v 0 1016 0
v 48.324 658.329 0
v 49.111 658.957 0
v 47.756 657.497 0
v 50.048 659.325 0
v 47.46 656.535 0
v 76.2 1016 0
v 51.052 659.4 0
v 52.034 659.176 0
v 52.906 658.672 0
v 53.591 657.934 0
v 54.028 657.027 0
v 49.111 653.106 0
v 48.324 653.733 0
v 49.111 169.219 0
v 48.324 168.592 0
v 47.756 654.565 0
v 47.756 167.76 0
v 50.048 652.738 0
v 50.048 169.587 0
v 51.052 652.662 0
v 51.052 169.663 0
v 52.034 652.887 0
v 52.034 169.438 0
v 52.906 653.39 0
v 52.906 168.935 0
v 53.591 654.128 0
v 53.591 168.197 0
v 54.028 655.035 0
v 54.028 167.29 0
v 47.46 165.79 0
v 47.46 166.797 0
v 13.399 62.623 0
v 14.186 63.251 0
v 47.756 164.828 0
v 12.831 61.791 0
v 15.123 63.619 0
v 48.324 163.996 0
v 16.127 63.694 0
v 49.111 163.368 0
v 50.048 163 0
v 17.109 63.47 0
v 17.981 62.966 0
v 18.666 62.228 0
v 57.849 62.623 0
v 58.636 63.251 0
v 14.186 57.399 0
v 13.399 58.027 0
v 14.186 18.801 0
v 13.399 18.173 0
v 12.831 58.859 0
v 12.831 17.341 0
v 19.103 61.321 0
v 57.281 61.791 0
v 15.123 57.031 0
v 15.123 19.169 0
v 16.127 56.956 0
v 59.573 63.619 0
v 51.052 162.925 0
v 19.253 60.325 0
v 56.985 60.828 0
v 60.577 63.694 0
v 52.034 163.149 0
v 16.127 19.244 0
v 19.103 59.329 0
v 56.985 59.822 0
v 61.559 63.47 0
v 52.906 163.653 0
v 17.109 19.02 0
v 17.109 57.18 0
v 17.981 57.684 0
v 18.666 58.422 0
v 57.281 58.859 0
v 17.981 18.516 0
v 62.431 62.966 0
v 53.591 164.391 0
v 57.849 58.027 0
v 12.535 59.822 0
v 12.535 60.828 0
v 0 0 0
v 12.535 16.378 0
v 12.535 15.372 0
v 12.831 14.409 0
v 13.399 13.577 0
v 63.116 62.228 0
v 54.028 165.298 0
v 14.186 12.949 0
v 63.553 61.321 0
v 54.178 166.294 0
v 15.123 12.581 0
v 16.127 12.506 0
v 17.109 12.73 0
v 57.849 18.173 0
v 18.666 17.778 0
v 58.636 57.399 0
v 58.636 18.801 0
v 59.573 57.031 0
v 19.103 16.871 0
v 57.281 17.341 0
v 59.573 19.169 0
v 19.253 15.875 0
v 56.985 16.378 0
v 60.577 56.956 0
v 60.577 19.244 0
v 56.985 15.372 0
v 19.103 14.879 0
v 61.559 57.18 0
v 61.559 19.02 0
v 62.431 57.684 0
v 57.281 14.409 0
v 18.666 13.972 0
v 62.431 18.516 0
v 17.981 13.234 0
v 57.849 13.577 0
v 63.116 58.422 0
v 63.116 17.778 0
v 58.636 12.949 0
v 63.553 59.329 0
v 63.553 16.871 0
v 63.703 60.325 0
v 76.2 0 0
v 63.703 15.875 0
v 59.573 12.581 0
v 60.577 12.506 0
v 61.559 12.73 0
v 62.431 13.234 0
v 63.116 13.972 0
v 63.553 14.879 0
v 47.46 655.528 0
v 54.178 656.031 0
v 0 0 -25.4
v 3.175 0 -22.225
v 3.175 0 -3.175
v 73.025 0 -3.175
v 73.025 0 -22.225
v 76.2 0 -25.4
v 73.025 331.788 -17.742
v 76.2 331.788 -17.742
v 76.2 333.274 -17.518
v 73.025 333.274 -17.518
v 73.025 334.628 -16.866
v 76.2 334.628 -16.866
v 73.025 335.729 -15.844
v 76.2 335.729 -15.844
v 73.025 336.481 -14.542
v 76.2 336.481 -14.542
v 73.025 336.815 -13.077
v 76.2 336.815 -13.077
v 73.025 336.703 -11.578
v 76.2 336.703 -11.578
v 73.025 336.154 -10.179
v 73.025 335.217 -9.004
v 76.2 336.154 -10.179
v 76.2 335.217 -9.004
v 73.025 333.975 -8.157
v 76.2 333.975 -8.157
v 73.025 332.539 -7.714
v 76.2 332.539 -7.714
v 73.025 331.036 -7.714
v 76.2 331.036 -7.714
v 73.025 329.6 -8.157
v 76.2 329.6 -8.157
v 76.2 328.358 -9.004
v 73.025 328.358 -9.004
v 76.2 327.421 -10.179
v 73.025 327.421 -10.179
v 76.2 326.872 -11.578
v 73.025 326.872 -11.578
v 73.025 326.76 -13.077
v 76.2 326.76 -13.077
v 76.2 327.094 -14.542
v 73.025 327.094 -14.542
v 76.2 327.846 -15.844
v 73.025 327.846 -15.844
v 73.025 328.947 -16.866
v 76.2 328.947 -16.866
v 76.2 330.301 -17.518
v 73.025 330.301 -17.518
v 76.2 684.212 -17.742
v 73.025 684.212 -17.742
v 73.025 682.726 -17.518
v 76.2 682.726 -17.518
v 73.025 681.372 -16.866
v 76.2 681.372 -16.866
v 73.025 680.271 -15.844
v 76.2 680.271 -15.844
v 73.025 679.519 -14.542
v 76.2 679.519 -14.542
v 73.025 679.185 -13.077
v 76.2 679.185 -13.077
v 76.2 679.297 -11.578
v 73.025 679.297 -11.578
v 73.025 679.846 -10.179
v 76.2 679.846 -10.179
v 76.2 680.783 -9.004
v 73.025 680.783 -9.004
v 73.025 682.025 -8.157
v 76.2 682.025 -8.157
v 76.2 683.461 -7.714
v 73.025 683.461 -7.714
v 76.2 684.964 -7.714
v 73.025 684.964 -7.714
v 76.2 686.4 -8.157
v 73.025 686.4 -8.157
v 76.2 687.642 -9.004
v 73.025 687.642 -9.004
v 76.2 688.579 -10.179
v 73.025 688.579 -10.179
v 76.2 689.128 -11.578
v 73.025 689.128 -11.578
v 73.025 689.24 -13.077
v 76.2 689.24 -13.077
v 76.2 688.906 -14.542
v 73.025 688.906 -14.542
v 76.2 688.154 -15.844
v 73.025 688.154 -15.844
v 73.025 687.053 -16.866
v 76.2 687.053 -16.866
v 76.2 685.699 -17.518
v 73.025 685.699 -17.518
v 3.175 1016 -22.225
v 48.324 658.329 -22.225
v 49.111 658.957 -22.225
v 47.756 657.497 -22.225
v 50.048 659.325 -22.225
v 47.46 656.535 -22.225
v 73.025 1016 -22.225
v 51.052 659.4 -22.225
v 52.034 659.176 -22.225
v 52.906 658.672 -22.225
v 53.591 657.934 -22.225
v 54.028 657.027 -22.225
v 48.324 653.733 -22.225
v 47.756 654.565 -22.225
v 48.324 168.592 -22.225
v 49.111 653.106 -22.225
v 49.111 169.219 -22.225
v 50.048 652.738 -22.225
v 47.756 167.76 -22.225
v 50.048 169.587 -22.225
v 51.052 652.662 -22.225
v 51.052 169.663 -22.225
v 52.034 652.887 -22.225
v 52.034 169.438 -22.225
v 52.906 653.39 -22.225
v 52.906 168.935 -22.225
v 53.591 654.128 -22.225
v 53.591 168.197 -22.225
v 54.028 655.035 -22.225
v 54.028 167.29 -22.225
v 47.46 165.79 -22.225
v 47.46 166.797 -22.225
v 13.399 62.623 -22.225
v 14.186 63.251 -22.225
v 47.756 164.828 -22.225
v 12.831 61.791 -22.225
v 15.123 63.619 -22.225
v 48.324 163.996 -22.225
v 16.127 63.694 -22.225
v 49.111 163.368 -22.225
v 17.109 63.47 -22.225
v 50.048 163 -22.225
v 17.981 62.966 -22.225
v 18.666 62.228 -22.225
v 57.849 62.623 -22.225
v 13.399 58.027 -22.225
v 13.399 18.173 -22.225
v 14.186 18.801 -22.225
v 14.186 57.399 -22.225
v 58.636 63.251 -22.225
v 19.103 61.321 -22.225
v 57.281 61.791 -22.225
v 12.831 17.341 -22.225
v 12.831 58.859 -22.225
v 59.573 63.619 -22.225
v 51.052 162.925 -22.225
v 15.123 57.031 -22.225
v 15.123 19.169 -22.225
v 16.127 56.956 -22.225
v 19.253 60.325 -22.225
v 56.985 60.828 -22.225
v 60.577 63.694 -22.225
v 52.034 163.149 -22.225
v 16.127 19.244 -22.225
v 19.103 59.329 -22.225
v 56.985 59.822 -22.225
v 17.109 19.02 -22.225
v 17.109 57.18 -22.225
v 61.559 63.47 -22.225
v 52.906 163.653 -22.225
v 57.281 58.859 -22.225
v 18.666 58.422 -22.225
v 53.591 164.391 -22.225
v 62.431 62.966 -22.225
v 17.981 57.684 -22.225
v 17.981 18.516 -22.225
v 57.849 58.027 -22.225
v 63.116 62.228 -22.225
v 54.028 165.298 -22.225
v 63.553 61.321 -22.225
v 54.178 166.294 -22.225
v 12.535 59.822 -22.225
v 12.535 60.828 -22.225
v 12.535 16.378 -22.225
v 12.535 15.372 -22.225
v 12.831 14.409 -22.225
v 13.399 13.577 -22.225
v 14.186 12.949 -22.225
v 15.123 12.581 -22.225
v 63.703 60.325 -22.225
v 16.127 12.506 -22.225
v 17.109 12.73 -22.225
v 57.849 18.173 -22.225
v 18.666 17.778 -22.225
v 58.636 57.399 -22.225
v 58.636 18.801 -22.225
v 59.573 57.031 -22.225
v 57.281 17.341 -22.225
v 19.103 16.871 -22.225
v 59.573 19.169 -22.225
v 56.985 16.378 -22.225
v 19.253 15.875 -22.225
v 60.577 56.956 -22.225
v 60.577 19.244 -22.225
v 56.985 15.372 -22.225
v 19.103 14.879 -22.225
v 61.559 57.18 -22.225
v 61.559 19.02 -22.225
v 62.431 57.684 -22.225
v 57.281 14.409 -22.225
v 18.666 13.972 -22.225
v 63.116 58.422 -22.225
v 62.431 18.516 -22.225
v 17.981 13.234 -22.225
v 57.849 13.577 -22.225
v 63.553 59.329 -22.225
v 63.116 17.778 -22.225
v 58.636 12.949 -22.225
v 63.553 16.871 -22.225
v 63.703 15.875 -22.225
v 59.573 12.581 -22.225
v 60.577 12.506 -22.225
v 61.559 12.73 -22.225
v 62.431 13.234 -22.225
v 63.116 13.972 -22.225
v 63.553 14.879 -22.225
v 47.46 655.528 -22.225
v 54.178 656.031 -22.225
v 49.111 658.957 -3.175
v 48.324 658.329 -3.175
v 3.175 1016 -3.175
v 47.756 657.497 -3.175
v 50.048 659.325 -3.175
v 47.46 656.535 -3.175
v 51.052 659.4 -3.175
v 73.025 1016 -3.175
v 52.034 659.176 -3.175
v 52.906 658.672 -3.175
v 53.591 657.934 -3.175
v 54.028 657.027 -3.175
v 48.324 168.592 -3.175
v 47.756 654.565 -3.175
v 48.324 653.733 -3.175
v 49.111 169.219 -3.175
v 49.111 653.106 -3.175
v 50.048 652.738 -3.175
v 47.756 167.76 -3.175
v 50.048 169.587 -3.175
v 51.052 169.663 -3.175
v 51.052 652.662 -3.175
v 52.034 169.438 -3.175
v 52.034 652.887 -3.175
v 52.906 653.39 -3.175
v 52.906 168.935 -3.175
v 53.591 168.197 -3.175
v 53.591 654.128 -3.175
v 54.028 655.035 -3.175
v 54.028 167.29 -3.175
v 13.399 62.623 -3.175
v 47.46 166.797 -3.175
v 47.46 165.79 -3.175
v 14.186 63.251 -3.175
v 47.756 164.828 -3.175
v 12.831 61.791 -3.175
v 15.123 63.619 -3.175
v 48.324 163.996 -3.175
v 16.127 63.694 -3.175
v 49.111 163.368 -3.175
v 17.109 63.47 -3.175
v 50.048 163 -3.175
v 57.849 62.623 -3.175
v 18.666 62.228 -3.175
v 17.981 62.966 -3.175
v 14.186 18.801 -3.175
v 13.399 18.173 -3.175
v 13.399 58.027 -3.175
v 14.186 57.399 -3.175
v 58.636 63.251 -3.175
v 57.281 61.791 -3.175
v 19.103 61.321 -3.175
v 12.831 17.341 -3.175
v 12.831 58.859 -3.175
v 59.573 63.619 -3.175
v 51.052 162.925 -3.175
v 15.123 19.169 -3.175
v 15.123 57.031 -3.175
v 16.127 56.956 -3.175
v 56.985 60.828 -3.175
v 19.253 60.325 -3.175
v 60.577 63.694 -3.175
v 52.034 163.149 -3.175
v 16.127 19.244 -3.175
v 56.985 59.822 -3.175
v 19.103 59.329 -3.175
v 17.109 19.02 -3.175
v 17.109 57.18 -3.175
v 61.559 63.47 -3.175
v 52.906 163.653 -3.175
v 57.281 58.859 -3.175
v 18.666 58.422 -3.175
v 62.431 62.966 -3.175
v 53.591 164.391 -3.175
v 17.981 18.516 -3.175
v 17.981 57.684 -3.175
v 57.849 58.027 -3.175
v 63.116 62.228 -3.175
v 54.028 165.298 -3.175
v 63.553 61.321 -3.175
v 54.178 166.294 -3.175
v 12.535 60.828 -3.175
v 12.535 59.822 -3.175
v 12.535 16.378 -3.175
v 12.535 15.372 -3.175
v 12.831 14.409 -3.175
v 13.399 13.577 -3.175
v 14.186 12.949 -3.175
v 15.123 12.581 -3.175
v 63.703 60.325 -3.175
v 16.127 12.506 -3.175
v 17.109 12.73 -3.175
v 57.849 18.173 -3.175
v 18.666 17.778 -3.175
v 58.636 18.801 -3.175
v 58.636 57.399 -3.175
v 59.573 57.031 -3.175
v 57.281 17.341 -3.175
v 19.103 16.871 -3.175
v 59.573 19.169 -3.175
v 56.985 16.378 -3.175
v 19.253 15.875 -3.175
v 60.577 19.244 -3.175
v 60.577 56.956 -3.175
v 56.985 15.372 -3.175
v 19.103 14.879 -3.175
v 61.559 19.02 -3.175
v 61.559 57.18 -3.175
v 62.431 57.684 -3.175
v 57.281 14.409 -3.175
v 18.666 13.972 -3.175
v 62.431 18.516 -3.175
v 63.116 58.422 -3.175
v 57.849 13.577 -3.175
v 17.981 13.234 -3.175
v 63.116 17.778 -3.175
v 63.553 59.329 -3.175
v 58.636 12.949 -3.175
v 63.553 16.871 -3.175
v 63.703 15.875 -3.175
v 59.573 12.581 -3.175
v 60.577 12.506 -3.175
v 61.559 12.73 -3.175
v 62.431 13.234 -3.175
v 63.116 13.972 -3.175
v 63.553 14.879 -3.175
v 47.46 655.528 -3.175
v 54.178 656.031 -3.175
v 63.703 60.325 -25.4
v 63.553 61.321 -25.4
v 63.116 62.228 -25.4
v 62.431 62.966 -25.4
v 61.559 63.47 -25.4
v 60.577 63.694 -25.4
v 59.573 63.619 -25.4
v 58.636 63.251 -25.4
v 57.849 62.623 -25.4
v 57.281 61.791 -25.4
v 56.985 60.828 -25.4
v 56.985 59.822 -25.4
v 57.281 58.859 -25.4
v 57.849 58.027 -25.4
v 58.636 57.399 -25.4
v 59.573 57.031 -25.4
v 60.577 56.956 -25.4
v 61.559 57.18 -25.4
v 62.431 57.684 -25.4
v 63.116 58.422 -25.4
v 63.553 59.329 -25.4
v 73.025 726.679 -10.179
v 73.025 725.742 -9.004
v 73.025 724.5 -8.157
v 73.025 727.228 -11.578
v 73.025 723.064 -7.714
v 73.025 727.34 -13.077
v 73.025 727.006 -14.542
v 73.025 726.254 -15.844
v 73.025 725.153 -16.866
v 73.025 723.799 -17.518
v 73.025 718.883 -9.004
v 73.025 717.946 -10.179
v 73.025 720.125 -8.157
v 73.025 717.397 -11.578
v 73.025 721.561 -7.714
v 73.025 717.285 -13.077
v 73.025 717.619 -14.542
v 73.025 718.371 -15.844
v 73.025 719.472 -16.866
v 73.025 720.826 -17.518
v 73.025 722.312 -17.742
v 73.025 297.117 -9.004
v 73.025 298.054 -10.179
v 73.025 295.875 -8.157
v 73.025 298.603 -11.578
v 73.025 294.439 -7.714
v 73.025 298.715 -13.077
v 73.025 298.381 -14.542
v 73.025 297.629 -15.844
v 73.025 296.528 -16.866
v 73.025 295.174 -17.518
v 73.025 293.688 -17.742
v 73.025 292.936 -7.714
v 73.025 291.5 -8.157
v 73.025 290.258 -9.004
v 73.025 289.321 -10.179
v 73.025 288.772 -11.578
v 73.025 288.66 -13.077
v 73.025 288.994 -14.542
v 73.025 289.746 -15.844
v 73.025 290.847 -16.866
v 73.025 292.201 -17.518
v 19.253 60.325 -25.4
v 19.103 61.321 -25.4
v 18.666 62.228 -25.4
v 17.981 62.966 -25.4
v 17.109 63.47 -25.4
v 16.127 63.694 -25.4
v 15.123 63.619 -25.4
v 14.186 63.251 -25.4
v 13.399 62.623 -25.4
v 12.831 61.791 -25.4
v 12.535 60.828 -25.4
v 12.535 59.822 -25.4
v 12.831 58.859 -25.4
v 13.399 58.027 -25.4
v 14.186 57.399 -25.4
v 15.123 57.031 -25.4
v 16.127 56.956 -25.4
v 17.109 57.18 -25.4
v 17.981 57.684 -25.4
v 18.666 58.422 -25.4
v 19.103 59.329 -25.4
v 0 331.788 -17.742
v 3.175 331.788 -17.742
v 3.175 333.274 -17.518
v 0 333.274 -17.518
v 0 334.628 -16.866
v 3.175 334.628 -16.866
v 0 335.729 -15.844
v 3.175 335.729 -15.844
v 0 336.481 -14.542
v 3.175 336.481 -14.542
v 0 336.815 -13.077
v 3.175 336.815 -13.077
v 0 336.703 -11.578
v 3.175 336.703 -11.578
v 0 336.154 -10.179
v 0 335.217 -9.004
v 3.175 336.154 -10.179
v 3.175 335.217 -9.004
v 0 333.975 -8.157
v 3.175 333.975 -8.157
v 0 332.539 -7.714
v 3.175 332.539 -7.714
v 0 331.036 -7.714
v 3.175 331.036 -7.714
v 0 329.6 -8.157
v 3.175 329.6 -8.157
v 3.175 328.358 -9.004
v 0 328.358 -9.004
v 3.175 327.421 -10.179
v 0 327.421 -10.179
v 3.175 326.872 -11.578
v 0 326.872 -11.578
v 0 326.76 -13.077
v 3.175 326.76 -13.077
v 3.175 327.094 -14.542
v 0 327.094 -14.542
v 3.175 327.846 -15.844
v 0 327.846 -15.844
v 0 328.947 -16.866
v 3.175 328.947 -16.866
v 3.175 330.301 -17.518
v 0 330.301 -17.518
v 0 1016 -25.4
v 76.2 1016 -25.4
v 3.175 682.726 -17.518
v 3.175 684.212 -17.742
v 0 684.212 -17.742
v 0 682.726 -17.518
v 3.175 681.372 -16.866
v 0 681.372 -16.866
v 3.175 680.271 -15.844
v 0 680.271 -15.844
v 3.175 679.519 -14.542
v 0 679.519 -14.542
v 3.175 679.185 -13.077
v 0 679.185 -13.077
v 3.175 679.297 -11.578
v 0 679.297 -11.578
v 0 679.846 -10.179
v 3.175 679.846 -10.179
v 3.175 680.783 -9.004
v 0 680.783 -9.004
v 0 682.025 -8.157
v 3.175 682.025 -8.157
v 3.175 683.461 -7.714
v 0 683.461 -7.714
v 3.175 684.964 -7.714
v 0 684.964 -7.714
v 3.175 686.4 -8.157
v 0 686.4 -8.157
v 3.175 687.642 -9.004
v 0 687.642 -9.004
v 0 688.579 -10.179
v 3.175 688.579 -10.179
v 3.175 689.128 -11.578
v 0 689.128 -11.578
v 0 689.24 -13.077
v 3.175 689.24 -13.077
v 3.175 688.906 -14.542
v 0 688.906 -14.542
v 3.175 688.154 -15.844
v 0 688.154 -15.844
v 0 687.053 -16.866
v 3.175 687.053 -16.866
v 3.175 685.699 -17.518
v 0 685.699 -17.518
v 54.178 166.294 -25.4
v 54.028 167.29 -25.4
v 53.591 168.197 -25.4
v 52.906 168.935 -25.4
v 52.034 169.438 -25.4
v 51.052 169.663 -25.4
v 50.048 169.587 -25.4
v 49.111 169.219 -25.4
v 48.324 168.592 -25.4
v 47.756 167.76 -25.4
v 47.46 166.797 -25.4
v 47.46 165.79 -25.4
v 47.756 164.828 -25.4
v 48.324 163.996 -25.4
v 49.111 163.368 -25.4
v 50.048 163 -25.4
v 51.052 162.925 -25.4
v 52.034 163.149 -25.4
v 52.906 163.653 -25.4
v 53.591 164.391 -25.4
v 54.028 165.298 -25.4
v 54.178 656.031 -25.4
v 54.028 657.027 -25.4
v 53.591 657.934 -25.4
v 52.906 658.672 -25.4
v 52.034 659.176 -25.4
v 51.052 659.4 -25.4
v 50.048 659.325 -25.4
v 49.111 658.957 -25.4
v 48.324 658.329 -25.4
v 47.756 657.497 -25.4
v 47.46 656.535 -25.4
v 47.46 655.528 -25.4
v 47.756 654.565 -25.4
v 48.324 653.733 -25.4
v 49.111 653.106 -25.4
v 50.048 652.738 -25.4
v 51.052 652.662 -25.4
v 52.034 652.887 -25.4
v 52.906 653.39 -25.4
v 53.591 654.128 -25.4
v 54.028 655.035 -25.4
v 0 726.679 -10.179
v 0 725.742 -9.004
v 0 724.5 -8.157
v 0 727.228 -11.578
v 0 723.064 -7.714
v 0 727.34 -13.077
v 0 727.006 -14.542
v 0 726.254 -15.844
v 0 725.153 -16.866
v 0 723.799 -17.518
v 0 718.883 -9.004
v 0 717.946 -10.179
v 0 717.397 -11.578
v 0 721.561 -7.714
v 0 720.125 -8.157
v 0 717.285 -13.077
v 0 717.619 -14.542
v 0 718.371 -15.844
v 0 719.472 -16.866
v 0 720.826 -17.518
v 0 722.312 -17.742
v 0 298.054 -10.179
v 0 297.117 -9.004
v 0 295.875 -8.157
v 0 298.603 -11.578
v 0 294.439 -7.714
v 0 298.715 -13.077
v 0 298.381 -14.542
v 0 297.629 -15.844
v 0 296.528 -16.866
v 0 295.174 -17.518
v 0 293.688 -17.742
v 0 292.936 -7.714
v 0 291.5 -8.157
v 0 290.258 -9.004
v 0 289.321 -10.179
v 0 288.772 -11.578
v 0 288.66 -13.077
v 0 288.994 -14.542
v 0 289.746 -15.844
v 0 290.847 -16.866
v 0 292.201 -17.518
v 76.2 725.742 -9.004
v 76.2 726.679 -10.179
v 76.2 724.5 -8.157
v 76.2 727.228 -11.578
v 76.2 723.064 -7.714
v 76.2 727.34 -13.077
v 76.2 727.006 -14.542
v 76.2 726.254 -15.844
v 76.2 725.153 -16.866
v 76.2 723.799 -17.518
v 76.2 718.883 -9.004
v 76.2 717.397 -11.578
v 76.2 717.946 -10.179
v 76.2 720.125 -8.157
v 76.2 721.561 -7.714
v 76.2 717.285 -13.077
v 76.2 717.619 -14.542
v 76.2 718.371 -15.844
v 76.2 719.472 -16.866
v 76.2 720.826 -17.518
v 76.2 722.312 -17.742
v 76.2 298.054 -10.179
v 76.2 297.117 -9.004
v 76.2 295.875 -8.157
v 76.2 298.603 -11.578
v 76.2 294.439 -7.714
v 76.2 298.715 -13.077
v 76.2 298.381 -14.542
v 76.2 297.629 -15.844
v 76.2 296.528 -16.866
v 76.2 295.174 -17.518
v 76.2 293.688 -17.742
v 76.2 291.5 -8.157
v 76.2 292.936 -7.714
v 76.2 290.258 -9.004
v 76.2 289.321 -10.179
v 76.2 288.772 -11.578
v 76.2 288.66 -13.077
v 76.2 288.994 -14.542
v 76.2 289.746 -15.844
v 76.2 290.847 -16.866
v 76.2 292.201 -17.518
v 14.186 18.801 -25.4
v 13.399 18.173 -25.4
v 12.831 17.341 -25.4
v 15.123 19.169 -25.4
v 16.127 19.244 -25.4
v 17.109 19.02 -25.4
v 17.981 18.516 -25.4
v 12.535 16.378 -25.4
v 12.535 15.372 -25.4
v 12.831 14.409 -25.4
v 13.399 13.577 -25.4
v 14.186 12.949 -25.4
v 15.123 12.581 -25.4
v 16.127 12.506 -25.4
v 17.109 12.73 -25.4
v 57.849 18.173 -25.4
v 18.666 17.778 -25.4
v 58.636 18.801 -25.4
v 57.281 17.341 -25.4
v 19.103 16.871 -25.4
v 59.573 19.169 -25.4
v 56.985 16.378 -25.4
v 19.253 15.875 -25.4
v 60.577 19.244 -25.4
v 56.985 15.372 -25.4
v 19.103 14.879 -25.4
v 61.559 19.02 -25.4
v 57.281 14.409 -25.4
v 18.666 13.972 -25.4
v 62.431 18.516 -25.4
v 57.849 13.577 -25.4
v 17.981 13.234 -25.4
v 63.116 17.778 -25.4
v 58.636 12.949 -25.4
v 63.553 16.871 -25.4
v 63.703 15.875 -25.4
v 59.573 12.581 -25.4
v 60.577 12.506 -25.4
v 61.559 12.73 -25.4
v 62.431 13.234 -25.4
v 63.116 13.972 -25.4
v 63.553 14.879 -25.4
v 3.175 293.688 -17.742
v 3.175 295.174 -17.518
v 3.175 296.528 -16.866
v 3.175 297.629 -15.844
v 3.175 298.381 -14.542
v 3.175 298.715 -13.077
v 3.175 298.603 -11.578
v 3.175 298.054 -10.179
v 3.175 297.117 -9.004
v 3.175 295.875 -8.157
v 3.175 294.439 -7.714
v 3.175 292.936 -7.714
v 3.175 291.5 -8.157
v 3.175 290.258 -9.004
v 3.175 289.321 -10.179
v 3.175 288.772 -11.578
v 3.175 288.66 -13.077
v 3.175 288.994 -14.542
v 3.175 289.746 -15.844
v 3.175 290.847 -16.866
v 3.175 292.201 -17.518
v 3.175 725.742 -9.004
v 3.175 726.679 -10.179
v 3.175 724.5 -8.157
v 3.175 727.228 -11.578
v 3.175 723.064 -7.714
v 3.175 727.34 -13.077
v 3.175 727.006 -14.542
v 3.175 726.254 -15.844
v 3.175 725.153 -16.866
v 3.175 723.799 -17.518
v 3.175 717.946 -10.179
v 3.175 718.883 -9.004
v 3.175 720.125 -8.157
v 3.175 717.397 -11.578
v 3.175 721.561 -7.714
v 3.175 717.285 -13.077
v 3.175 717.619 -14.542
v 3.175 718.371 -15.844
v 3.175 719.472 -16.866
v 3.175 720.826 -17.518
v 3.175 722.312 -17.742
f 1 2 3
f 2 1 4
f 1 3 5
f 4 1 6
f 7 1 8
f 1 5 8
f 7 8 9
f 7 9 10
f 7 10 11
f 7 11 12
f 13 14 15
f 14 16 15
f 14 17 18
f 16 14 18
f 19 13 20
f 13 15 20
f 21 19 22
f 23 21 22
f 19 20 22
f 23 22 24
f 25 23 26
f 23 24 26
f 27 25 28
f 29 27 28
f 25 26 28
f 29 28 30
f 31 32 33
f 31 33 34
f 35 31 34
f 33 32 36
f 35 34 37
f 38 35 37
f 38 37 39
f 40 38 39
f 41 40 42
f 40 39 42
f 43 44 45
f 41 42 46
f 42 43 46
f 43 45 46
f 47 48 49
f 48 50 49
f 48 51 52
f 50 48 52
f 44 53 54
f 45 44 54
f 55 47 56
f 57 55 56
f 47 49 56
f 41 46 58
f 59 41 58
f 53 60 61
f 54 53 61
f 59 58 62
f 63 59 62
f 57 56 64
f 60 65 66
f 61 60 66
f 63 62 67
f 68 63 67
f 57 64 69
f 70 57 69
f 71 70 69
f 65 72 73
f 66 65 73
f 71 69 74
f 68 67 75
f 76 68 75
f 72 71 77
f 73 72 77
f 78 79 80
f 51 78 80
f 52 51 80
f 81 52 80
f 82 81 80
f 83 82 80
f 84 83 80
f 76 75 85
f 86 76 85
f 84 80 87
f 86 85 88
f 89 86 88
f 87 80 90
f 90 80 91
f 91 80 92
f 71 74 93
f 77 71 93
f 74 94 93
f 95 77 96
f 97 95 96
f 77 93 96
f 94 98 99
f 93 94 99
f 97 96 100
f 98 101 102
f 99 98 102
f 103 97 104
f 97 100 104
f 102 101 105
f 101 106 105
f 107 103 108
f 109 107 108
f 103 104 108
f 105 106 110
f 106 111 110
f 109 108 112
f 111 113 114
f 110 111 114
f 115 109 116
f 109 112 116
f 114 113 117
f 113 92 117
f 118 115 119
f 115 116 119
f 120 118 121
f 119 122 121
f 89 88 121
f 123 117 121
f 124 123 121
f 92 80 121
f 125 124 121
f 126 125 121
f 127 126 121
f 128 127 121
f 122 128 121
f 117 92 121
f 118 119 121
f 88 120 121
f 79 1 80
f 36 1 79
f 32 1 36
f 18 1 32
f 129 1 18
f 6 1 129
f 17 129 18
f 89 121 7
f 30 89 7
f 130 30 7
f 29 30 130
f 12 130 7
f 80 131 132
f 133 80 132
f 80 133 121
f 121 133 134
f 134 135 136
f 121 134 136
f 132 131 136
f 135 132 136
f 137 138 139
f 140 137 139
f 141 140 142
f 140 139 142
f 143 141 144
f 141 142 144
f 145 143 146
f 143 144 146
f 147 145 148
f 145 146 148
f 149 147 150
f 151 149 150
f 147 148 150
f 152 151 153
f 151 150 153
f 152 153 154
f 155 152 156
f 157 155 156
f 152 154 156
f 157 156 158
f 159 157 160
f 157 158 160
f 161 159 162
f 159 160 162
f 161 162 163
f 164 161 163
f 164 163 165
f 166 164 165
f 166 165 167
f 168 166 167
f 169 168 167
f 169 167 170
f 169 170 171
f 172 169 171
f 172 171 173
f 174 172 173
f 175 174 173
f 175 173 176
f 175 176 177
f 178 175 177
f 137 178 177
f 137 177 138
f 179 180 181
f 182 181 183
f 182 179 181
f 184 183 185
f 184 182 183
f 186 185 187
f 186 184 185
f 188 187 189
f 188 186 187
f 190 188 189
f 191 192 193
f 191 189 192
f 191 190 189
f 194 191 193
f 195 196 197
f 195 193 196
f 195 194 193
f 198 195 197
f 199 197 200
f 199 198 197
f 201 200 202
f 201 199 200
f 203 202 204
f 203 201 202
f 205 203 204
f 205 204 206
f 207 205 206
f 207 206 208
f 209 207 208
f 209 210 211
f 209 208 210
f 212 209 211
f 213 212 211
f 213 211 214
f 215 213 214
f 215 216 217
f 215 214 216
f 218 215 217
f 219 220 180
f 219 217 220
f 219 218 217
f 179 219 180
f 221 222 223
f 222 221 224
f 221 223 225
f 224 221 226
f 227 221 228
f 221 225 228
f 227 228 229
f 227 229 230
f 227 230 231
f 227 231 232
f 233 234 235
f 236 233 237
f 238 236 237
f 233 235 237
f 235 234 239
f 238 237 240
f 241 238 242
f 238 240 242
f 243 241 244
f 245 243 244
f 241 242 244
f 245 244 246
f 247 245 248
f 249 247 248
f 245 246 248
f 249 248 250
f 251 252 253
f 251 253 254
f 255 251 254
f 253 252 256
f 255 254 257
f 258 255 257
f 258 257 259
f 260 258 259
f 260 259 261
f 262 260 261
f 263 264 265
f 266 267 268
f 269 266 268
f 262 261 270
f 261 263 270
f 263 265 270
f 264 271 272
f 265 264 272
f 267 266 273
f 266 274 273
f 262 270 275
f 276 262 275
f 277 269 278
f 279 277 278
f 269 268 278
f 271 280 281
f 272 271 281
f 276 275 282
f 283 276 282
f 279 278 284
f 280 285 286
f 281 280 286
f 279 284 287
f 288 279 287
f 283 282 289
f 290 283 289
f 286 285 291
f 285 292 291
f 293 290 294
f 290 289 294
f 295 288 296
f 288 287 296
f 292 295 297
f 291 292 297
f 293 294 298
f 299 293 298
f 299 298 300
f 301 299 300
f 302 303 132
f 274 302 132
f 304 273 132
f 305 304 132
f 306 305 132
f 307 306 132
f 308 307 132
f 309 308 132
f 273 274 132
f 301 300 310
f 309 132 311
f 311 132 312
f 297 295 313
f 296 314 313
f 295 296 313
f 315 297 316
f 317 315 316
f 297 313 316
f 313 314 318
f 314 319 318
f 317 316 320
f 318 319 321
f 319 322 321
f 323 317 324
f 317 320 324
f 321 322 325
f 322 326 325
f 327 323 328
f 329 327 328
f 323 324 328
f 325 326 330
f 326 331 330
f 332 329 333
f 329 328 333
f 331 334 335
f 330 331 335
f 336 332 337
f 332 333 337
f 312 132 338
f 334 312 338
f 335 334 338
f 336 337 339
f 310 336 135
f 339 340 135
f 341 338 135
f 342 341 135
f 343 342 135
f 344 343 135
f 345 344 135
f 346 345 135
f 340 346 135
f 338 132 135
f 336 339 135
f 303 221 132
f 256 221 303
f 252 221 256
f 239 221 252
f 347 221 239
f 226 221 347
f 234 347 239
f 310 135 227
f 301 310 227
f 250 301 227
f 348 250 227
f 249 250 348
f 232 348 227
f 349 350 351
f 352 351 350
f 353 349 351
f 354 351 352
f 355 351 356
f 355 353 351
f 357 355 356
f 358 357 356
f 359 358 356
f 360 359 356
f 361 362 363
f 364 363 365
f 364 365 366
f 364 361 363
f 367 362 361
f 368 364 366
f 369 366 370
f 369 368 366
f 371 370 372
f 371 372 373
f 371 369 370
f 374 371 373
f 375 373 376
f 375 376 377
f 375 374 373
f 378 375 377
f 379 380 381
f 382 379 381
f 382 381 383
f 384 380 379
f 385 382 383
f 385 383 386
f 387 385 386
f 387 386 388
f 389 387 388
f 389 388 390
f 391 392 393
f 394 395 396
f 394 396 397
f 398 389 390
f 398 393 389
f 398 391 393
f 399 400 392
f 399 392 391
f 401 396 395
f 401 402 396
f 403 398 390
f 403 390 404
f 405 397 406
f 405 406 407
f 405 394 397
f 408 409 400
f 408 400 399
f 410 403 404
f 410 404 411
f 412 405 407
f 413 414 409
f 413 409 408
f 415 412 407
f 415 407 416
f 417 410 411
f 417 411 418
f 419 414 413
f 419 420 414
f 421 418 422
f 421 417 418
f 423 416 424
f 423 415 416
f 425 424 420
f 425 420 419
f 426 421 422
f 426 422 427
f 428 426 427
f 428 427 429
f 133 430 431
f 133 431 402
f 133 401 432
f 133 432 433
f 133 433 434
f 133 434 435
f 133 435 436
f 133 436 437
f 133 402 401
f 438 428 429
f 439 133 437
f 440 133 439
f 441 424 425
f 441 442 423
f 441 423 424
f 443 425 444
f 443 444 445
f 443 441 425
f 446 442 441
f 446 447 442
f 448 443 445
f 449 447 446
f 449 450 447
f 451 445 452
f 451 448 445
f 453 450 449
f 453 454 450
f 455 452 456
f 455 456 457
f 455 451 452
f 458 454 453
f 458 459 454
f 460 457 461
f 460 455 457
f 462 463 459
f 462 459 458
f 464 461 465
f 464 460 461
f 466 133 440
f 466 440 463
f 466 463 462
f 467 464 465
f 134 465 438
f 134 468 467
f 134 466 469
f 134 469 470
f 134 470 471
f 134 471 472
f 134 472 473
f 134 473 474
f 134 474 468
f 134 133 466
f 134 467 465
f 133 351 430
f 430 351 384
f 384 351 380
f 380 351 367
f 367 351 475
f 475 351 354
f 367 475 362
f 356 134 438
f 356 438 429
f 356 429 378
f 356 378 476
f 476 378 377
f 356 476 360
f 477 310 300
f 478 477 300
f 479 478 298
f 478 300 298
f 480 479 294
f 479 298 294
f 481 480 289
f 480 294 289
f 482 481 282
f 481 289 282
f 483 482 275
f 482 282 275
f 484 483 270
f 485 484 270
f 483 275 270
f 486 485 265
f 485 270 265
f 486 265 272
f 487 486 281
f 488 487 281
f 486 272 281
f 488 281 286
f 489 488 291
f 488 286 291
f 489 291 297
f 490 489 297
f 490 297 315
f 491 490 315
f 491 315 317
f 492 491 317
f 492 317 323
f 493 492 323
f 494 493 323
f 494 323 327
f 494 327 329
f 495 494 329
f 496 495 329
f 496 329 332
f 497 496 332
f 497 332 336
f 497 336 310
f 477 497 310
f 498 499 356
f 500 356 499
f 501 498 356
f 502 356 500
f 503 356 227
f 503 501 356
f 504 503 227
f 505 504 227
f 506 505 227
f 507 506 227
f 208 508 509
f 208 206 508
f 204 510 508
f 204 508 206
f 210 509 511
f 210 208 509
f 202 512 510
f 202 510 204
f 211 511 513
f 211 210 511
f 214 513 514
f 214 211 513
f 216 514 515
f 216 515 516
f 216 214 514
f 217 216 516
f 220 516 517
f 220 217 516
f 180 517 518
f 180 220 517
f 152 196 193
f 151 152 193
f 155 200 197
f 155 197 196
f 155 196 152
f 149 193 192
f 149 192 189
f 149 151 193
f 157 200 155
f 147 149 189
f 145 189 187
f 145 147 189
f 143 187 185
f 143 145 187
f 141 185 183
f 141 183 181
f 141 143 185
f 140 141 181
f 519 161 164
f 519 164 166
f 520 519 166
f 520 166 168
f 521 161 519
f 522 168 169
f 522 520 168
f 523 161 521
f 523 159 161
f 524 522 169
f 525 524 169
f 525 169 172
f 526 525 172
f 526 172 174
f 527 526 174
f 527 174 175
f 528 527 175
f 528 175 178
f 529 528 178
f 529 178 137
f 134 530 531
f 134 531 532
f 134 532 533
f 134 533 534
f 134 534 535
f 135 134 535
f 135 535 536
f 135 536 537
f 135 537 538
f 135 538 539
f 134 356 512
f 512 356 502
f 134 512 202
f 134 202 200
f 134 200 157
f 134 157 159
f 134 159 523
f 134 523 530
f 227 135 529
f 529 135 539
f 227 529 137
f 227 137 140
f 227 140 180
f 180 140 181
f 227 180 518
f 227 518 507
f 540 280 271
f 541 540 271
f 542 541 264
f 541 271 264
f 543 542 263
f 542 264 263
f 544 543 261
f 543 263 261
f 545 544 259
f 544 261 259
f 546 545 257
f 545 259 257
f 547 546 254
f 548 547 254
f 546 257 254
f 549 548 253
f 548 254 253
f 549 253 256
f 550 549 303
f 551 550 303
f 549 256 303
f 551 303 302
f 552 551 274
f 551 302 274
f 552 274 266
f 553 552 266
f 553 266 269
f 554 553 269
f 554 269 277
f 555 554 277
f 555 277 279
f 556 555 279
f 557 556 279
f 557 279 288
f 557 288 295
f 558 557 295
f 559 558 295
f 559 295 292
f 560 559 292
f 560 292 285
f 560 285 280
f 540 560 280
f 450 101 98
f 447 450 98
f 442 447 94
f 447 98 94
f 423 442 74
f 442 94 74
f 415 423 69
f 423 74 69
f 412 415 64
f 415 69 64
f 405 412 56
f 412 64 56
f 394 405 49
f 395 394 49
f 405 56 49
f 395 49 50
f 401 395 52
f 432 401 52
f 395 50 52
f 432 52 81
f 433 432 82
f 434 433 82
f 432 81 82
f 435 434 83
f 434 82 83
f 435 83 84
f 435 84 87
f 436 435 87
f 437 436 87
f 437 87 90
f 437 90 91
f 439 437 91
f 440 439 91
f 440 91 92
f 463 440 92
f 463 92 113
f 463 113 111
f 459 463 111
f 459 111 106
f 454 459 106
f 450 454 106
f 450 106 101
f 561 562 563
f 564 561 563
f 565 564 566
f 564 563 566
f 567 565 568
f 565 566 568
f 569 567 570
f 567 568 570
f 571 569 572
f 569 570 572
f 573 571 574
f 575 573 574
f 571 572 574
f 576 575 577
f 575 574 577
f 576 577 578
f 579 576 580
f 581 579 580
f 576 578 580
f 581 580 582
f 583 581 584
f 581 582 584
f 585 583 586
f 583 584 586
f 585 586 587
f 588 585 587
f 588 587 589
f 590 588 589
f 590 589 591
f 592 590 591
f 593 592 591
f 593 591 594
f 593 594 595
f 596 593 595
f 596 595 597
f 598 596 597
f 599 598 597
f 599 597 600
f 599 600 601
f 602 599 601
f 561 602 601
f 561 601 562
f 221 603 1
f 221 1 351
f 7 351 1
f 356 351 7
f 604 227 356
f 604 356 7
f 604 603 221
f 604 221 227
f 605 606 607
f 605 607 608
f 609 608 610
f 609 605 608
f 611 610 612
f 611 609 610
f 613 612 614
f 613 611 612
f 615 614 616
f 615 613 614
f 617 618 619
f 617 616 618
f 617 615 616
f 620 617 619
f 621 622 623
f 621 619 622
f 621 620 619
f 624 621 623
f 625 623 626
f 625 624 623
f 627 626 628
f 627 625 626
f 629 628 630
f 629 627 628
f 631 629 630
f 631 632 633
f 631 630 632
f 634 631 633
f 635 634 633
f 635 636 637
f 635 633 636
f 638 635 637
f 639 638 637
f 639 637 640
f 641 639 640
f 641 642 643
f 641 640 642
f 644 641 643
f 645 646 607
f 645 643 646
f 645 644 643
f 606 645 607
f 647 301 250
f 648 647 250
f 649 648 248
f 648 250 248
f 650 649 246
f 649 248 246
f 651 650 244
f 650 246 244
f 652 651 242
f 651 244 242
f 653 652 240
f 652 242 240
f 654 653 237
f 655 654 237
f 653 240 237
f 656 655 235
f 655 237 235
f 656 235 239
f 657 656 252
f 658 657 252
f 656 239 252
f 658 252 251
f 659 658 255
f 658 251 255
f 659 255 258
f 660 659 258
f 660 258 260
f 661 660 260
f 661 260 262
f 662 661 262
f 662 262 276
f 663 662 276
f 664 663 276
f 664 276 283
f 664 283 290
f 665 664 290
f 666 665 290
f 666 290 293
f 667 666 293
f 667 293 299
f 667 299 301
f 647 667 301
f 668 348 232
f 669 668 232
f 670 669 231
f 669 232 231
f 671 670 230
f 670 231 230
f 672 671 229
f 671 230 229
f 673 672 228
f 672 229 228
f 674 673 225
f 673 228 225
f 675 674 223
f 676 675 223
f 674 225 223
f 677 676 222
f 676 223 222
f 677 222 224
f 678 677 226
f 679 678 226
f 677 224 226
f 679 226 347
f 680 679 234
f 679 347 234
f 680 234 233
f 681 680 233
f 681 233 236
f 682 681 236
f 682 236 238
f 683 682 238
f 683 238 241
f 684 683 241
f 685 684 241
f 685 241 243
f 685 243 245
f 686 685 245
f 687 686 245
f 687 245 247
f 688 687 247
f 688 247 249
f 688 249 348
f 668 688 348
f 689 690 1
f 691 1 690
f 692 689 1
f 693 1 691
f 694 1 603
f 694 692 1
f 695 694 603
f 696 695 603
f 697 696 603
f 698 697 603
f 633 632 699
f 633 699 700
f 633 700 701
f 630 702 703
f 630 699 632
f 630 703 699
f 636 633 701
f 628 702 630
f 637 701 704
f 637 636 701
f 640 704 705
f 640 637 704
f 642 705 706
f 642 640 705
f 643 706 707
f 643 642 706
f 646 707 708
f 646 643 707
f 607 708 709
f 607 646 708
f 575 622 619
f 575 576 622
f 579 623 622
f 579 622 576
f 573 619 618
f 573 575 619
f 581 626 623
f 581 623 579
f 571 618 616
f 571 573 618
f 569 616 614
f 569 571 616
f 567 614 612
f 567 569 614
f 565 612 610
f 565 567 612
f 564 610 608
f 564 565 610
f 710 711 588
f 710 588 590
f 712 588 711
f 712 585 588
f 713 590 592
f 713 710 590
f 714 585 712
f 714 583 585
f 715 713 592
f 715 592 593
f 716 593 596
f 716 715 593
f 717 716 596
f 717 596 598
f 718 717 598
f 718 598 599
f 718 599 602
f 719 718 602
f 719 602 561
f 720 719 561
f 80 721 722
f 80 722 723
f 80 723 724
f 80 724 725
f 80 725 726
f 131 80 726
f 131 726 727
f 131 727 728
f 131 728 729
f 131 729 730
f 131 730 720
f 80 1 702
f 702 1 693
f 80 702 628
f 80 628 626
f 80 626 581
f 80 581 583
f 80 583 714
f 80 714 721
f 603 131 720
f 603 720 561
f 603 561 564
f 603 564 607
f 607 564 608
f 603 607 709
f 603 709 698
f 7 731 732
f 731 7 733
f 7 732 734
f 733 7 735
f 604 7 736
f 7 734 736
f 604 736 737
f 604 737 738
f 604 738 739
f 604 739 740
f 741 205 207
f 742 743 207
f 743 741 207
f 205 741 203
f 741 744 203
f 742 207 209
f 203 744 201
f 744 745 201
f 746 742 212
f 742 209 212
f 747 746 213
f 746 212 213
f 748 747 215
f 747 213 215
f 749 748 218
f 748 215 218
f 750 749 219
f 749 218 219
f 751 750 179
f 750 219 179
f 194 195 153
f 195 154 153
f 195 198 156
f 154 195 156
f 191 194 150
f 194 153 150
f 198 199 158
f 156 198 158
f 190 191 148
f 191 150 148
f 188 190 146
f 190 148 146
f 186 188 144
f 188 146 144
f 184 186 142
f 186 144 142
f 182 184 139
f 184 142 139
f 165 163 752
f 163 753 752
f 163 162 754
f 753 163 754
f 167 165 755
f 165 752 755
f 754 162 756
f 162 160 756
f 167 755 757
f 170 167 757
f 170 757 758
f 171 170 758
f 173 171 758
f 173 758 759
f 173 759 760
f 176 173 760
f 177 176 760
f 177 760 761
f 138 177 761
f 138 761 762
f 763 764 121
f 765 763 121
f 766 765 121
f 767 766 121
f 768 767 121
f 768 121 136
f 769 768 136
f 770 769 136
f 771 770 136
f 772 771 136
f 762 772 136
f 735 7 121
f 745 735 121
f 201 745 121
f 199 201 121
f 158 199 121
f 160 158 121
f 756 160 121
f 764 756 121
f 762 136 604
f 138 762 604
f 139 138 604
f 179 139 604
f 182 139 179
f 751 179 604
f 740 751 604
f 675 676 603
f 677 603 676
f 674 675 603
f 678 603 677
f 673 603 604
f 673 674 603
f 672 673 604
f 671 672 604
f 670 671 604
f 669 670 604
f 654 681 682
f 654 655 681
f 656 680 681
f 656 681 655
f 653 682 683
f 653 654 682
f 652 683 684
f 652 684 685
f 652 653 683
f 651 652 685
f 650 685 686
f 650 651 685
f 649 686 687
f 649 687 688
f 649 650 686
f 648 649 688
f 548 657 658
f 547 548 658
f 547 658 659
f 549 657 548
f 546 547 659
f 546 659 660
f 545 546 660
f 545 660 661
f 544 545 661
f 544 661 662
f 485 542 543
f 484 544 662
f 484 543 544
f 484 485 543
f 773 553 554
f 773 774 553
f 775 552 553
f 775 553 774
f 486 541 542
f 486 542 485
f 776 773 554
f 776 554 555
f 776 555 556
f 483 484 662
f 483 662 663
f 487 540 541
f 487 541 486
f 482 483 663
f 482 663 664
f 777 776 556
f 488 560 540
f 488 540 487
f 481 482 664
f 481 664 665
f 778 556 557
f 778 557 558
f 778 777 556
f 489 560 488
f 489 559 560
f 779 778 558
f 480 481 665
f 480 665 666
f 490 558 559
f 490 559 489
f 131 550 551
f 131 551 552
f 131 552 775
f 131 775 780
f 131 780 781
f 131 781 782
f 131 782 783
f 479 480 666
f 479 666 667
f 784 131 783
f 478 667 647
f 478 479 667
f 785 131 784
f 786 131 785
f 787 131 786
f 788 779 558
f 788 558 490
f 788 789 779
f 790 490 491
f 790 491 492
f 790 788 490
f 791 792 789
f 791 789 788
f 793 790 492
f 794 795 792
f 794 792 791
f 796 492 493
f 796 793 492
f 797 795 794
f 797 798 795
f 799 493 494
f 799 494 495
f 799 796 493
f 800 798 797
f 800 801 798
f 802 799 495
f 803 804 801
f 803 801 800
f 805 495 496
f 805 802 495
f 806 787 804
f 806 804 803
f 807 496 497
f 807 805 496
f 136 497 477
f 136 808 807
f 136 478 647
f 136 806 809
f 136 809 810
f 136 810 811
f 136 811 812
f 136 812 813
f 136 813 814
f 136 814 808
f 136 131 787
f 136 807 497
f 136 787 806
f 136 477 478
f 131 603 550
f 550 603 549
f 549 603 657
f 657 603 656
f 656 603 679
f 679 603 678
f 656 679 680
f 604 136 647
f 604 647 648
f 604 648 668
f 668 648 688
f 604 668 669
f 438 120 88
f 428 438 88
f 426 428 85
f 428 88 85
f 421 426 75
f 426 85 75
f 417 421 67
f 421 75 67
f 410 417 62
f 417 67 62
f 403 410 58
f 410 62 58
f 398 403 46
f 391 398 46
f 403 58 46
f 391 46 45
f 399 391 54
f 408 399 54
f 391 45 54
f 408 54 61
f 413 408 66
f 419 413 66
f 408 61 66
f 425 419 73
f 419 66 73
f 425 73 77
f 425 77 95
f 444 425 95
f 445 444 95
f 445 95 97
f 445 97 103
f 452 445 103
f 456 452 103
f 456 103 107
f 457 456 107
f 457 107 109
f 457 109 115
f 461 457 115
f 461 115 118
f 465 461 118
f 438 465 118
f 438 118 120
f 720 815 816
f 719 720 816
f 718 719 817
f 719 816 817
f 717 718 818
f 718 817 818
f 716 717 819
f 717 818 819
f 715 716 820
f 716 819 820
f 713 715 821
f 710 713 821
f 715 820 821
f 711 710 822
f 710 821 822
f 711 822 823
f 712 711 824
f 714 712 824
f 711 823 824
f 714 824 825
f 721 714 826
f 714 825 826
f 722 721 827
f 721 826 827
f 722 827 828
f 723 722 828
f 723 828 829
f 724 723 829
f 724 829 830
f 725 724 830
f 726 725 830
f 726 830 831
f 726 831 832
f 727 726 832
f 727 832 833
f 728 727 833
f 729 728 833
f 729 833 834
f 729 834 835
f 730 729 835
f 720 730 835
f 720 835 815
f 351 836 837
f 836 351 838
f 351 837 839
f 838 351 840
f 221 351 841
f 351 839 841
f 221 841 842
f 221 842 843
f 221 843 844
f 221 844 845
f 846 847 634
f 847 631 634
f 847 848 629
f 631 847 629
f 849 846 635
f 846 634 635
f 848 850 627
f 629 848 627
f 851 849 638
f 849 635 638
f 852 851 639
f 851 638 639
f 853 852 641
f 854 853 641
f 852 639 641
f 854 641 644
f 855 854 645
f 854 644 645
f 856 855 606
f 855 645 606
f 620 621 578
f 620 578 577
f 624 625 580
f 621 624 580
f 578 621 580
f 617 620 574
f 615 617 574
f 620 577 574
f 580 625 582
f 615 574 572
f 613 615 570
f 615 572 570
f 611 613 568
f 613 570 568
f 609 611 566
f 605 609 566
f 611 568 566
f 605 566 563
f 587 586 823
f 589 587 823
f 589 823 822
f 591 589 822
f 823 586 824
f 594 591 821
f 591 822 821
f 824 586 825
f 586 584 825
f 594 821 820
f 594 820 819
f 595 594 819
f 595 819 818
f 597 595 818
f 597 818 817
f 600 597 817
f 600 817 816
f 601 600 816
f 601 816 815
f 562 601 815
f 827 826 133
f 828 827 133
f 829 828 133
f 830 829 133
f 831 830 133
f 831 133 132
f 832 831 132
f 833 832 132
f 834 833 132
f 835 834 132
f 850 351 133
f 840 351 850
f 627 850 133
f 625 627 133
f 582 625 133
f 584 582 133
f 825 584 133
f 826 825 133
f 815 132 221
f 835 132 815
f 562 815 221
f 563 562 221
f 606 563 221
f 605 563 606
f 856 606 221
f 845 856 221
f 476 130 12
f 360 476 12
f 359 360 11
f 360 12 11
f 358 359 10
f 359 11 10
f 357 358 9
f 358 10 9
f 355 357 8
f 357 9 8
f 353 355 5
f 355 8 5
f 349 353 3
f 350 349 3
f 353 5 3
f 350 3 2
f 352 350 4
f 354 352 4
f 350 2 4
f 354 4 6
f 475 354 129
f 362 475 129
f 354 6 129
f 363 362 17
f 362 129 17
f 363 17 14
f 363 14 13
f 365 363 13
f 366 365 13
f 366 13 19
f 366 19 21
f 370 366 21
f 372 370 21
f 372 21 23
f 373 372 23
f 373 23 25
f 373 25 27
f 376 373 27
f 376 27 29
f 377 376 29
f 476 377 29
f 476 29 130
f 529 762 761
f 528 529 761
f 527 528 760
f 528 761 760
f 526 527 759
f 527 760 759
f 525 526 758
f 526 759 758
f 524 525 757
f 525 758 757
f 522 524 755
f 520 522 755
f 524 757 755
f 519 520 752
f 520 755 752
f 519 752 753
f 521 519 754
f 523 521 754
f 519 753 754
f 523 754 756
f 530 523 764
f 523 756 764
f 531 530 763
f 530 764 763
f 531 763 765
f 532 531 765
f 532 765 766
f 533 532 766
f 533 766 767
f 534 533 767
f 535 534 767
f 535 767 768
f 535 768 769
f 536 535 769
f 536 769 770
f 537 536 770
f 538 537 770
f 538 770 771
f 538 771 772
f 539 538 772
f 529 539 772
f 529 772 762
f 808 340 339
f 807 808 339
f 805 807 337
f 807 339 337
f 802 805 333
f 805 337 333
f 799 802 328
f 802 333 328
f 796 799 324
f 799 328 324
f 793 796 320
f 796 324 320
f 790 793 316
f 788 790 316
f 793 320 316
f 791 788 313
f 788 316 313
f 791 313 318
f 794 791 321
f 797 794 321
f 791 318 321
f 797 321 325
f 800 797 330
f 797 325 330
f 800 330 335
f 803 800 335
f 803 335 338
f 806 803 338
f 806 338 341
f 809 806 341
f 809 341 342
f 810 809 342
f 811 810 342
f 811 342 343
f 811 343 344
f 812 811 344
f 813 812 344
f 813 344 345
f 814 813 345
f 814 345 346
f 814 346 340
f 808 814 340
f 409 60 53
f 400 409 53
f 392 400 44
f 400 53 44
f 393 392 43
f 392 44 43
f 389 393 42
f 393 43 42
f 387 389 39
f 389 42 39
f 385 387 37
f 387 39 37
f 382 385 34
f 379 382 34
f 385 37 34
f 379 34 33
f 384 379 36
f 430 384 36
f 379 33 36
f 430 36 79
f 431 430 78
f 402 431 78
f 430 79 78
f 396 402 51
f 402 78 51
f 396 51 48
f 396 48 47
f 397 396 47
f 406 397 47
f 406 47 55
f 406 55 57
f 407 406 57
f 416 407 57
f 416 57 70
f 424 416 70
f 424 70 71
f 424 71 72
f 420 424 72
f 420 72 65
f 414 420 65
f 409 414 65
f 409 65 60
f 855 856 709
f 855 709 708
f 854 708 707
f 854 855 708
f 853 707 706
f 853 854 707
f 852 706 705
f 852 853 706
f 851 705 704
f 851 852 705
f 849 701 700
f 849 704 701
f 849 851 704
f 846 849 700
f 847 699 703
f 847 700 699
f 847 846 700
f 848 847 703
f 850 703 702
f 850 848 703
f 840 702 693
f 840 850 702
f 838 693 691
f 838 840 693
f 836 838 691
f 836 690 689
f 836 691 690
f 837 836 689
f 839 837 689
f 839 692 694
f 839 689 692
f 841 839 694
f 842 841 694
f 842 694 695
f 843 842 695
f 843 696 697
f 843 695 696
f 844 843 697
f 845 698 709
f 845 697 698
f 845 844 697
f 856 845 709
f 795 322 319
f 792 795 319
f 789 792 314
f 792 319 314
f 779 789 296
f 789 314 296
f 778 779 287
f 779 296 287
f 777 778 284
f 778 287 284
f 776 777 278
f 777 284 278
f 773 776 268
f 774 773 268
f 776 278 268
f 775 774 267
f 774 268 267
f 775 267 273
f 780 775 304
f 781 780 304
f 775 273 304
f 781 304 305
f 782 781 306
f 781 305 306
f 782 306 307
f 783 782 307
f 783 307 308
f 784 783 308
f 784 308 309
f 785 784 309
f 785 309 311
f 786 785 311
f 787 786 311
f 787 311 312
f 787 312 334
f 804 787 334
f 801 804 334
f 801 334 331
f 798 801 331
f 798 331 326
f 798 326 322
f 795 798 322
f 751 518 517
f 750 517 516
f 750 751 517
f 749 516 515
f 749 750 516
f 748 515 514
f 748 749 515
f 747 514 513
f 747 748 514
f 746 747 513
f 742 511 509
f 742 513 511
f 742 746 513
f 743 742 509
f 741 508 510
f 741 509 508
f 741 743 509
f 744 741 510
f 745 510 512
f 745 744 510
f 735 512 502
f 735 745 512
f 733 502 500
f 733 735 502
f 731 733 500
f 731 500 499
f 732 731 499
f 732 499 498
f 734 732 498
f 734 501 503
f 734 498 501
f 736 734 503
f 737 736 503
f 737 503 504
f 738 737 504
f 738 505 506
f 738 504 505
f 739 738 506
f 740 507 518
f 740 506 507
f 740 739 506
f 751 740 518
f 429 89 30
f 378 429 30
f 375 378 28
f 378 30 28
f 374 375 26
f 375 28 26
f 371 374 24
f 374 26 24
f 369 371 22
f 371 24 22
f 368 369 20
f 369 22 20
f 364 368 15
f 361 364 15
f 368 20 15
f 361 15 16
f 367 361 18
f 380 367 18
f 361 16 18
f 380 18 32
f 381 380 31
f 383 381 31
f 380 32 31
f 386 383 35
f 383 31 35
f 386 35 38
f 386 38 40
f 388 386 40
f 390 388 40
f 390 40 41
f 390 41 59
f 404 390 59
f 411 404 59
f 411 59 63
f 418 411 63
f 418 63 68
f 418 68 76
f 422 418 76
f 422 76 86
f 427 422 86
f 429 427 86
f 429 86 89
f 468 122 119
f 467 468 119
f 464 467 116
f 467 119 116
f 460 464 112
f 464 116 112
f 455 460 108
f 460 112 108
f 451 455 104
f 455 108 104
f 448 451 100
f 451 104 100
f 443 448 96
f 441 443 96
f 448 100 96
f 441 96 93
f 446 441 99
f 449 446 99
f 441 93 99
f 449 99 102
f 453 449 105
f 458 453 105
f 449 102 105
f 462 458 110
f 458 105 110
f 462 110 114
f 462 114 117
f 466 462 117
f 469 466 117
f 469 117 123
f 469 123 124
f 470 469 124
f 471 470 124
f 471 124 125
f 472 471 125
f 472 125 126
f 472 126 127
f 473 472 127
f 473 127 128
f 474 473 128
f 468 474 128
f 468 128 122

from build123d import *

# Parameters (mm, degrees)
SKETCH1_W           = 76.2
SKETCH1_H           = 25.4
SKETCH1_W_2         = 69.85
SKETCH1_H_2         = 19.05
BOSS_EXTRUDE1_DEPTH = 1016
SKETCH2_R           = 5.0419
CUT_EXTRUDE1_DEPTH  = 77.2
SKETCH3_R           = 3.3782
CUT_EXTRUDE2_DEPTH  = 26.4
SKETCH4_R           = 3.3782
CUT_EXTRUDE3_DEPTH  = 26.4


with BuildPart() as part:
    # Sketch1 → Boss-Extrude1 (new body)
    with BuildSketch(Plane(origin=(0, 0, 0), x_dir=(1, 0, 0), z_dir=(0, 1, 0))):
        with Locations((38.1, 12.7)):
            Rectangle(SKETCH1_W, SKETCH1_H)
        with Locations((38.1, 12.7)):
            Rectangle(SKETCH1_W_2, SKETCH1_H_2, mode=Mode.SUBTRACT)
    extrude(amount=BOSS_EXTRUDE1_DEPTH)

    # Sketch2 → Cut-Extrude1 (cut, through all)
    with BuildSketch(Plane(origin=(76.2, 0, 0), x_dir=(0, 0, -1), z_dir=(1, 0, 0))):
        with Locations((12.7, 293.6875)):
            Circle(SKETCH2_R)
        with Locations((12.7, 331.7875)):
            Circle(SKETCH2_R)
    cut_extrude1 = extrude(amount=-CUT_EXTRUDE1_DEPTH, mode=Mode.SUBTRACT)

    # Mirror1: Cut-Extrude1 across plane
    add(cut_extrude1.mirror(Plane(origin=(0, 508, 0), x_dir=(0, 0, 1), z_dir=(0, -1, 0))), mode=Mode.SUBTRACT)

    # Sketch3 → Cut-Extrude2 (cut, through all)
    with BuildSketch(Plane.XY):
        with Locations((15.875, 15.875)):
            Circle(SKETCH3_R)
        with Locations((15.875, 60.325)):
            Circle(SKETCH3_R)
        with Locations((60.325, 15.875)):
            Circle(SKETCH3_R)
        with Locations((60.325, 60.325)):
            Circle(SKETCH3_R)
    extrude(amount=-CUT_EXTRUDE2_DEPTH, mode=Mode.SUBTRACT)

    # Sketch4 → Cut-Extrude3 (cut, through all)
    with BuildSketch(Plane.XY):
        with Locations((50.8, 166.2938)):
            Circle(SKETCH4_R)
        with Locations((50.8, 656.0312)):
            Circle(SKETCH4_R)
    extrude(amount=-CUT_EXTRUDE3_DEPTH, mode=Mode.SUBTRACT)


solid = part.part
